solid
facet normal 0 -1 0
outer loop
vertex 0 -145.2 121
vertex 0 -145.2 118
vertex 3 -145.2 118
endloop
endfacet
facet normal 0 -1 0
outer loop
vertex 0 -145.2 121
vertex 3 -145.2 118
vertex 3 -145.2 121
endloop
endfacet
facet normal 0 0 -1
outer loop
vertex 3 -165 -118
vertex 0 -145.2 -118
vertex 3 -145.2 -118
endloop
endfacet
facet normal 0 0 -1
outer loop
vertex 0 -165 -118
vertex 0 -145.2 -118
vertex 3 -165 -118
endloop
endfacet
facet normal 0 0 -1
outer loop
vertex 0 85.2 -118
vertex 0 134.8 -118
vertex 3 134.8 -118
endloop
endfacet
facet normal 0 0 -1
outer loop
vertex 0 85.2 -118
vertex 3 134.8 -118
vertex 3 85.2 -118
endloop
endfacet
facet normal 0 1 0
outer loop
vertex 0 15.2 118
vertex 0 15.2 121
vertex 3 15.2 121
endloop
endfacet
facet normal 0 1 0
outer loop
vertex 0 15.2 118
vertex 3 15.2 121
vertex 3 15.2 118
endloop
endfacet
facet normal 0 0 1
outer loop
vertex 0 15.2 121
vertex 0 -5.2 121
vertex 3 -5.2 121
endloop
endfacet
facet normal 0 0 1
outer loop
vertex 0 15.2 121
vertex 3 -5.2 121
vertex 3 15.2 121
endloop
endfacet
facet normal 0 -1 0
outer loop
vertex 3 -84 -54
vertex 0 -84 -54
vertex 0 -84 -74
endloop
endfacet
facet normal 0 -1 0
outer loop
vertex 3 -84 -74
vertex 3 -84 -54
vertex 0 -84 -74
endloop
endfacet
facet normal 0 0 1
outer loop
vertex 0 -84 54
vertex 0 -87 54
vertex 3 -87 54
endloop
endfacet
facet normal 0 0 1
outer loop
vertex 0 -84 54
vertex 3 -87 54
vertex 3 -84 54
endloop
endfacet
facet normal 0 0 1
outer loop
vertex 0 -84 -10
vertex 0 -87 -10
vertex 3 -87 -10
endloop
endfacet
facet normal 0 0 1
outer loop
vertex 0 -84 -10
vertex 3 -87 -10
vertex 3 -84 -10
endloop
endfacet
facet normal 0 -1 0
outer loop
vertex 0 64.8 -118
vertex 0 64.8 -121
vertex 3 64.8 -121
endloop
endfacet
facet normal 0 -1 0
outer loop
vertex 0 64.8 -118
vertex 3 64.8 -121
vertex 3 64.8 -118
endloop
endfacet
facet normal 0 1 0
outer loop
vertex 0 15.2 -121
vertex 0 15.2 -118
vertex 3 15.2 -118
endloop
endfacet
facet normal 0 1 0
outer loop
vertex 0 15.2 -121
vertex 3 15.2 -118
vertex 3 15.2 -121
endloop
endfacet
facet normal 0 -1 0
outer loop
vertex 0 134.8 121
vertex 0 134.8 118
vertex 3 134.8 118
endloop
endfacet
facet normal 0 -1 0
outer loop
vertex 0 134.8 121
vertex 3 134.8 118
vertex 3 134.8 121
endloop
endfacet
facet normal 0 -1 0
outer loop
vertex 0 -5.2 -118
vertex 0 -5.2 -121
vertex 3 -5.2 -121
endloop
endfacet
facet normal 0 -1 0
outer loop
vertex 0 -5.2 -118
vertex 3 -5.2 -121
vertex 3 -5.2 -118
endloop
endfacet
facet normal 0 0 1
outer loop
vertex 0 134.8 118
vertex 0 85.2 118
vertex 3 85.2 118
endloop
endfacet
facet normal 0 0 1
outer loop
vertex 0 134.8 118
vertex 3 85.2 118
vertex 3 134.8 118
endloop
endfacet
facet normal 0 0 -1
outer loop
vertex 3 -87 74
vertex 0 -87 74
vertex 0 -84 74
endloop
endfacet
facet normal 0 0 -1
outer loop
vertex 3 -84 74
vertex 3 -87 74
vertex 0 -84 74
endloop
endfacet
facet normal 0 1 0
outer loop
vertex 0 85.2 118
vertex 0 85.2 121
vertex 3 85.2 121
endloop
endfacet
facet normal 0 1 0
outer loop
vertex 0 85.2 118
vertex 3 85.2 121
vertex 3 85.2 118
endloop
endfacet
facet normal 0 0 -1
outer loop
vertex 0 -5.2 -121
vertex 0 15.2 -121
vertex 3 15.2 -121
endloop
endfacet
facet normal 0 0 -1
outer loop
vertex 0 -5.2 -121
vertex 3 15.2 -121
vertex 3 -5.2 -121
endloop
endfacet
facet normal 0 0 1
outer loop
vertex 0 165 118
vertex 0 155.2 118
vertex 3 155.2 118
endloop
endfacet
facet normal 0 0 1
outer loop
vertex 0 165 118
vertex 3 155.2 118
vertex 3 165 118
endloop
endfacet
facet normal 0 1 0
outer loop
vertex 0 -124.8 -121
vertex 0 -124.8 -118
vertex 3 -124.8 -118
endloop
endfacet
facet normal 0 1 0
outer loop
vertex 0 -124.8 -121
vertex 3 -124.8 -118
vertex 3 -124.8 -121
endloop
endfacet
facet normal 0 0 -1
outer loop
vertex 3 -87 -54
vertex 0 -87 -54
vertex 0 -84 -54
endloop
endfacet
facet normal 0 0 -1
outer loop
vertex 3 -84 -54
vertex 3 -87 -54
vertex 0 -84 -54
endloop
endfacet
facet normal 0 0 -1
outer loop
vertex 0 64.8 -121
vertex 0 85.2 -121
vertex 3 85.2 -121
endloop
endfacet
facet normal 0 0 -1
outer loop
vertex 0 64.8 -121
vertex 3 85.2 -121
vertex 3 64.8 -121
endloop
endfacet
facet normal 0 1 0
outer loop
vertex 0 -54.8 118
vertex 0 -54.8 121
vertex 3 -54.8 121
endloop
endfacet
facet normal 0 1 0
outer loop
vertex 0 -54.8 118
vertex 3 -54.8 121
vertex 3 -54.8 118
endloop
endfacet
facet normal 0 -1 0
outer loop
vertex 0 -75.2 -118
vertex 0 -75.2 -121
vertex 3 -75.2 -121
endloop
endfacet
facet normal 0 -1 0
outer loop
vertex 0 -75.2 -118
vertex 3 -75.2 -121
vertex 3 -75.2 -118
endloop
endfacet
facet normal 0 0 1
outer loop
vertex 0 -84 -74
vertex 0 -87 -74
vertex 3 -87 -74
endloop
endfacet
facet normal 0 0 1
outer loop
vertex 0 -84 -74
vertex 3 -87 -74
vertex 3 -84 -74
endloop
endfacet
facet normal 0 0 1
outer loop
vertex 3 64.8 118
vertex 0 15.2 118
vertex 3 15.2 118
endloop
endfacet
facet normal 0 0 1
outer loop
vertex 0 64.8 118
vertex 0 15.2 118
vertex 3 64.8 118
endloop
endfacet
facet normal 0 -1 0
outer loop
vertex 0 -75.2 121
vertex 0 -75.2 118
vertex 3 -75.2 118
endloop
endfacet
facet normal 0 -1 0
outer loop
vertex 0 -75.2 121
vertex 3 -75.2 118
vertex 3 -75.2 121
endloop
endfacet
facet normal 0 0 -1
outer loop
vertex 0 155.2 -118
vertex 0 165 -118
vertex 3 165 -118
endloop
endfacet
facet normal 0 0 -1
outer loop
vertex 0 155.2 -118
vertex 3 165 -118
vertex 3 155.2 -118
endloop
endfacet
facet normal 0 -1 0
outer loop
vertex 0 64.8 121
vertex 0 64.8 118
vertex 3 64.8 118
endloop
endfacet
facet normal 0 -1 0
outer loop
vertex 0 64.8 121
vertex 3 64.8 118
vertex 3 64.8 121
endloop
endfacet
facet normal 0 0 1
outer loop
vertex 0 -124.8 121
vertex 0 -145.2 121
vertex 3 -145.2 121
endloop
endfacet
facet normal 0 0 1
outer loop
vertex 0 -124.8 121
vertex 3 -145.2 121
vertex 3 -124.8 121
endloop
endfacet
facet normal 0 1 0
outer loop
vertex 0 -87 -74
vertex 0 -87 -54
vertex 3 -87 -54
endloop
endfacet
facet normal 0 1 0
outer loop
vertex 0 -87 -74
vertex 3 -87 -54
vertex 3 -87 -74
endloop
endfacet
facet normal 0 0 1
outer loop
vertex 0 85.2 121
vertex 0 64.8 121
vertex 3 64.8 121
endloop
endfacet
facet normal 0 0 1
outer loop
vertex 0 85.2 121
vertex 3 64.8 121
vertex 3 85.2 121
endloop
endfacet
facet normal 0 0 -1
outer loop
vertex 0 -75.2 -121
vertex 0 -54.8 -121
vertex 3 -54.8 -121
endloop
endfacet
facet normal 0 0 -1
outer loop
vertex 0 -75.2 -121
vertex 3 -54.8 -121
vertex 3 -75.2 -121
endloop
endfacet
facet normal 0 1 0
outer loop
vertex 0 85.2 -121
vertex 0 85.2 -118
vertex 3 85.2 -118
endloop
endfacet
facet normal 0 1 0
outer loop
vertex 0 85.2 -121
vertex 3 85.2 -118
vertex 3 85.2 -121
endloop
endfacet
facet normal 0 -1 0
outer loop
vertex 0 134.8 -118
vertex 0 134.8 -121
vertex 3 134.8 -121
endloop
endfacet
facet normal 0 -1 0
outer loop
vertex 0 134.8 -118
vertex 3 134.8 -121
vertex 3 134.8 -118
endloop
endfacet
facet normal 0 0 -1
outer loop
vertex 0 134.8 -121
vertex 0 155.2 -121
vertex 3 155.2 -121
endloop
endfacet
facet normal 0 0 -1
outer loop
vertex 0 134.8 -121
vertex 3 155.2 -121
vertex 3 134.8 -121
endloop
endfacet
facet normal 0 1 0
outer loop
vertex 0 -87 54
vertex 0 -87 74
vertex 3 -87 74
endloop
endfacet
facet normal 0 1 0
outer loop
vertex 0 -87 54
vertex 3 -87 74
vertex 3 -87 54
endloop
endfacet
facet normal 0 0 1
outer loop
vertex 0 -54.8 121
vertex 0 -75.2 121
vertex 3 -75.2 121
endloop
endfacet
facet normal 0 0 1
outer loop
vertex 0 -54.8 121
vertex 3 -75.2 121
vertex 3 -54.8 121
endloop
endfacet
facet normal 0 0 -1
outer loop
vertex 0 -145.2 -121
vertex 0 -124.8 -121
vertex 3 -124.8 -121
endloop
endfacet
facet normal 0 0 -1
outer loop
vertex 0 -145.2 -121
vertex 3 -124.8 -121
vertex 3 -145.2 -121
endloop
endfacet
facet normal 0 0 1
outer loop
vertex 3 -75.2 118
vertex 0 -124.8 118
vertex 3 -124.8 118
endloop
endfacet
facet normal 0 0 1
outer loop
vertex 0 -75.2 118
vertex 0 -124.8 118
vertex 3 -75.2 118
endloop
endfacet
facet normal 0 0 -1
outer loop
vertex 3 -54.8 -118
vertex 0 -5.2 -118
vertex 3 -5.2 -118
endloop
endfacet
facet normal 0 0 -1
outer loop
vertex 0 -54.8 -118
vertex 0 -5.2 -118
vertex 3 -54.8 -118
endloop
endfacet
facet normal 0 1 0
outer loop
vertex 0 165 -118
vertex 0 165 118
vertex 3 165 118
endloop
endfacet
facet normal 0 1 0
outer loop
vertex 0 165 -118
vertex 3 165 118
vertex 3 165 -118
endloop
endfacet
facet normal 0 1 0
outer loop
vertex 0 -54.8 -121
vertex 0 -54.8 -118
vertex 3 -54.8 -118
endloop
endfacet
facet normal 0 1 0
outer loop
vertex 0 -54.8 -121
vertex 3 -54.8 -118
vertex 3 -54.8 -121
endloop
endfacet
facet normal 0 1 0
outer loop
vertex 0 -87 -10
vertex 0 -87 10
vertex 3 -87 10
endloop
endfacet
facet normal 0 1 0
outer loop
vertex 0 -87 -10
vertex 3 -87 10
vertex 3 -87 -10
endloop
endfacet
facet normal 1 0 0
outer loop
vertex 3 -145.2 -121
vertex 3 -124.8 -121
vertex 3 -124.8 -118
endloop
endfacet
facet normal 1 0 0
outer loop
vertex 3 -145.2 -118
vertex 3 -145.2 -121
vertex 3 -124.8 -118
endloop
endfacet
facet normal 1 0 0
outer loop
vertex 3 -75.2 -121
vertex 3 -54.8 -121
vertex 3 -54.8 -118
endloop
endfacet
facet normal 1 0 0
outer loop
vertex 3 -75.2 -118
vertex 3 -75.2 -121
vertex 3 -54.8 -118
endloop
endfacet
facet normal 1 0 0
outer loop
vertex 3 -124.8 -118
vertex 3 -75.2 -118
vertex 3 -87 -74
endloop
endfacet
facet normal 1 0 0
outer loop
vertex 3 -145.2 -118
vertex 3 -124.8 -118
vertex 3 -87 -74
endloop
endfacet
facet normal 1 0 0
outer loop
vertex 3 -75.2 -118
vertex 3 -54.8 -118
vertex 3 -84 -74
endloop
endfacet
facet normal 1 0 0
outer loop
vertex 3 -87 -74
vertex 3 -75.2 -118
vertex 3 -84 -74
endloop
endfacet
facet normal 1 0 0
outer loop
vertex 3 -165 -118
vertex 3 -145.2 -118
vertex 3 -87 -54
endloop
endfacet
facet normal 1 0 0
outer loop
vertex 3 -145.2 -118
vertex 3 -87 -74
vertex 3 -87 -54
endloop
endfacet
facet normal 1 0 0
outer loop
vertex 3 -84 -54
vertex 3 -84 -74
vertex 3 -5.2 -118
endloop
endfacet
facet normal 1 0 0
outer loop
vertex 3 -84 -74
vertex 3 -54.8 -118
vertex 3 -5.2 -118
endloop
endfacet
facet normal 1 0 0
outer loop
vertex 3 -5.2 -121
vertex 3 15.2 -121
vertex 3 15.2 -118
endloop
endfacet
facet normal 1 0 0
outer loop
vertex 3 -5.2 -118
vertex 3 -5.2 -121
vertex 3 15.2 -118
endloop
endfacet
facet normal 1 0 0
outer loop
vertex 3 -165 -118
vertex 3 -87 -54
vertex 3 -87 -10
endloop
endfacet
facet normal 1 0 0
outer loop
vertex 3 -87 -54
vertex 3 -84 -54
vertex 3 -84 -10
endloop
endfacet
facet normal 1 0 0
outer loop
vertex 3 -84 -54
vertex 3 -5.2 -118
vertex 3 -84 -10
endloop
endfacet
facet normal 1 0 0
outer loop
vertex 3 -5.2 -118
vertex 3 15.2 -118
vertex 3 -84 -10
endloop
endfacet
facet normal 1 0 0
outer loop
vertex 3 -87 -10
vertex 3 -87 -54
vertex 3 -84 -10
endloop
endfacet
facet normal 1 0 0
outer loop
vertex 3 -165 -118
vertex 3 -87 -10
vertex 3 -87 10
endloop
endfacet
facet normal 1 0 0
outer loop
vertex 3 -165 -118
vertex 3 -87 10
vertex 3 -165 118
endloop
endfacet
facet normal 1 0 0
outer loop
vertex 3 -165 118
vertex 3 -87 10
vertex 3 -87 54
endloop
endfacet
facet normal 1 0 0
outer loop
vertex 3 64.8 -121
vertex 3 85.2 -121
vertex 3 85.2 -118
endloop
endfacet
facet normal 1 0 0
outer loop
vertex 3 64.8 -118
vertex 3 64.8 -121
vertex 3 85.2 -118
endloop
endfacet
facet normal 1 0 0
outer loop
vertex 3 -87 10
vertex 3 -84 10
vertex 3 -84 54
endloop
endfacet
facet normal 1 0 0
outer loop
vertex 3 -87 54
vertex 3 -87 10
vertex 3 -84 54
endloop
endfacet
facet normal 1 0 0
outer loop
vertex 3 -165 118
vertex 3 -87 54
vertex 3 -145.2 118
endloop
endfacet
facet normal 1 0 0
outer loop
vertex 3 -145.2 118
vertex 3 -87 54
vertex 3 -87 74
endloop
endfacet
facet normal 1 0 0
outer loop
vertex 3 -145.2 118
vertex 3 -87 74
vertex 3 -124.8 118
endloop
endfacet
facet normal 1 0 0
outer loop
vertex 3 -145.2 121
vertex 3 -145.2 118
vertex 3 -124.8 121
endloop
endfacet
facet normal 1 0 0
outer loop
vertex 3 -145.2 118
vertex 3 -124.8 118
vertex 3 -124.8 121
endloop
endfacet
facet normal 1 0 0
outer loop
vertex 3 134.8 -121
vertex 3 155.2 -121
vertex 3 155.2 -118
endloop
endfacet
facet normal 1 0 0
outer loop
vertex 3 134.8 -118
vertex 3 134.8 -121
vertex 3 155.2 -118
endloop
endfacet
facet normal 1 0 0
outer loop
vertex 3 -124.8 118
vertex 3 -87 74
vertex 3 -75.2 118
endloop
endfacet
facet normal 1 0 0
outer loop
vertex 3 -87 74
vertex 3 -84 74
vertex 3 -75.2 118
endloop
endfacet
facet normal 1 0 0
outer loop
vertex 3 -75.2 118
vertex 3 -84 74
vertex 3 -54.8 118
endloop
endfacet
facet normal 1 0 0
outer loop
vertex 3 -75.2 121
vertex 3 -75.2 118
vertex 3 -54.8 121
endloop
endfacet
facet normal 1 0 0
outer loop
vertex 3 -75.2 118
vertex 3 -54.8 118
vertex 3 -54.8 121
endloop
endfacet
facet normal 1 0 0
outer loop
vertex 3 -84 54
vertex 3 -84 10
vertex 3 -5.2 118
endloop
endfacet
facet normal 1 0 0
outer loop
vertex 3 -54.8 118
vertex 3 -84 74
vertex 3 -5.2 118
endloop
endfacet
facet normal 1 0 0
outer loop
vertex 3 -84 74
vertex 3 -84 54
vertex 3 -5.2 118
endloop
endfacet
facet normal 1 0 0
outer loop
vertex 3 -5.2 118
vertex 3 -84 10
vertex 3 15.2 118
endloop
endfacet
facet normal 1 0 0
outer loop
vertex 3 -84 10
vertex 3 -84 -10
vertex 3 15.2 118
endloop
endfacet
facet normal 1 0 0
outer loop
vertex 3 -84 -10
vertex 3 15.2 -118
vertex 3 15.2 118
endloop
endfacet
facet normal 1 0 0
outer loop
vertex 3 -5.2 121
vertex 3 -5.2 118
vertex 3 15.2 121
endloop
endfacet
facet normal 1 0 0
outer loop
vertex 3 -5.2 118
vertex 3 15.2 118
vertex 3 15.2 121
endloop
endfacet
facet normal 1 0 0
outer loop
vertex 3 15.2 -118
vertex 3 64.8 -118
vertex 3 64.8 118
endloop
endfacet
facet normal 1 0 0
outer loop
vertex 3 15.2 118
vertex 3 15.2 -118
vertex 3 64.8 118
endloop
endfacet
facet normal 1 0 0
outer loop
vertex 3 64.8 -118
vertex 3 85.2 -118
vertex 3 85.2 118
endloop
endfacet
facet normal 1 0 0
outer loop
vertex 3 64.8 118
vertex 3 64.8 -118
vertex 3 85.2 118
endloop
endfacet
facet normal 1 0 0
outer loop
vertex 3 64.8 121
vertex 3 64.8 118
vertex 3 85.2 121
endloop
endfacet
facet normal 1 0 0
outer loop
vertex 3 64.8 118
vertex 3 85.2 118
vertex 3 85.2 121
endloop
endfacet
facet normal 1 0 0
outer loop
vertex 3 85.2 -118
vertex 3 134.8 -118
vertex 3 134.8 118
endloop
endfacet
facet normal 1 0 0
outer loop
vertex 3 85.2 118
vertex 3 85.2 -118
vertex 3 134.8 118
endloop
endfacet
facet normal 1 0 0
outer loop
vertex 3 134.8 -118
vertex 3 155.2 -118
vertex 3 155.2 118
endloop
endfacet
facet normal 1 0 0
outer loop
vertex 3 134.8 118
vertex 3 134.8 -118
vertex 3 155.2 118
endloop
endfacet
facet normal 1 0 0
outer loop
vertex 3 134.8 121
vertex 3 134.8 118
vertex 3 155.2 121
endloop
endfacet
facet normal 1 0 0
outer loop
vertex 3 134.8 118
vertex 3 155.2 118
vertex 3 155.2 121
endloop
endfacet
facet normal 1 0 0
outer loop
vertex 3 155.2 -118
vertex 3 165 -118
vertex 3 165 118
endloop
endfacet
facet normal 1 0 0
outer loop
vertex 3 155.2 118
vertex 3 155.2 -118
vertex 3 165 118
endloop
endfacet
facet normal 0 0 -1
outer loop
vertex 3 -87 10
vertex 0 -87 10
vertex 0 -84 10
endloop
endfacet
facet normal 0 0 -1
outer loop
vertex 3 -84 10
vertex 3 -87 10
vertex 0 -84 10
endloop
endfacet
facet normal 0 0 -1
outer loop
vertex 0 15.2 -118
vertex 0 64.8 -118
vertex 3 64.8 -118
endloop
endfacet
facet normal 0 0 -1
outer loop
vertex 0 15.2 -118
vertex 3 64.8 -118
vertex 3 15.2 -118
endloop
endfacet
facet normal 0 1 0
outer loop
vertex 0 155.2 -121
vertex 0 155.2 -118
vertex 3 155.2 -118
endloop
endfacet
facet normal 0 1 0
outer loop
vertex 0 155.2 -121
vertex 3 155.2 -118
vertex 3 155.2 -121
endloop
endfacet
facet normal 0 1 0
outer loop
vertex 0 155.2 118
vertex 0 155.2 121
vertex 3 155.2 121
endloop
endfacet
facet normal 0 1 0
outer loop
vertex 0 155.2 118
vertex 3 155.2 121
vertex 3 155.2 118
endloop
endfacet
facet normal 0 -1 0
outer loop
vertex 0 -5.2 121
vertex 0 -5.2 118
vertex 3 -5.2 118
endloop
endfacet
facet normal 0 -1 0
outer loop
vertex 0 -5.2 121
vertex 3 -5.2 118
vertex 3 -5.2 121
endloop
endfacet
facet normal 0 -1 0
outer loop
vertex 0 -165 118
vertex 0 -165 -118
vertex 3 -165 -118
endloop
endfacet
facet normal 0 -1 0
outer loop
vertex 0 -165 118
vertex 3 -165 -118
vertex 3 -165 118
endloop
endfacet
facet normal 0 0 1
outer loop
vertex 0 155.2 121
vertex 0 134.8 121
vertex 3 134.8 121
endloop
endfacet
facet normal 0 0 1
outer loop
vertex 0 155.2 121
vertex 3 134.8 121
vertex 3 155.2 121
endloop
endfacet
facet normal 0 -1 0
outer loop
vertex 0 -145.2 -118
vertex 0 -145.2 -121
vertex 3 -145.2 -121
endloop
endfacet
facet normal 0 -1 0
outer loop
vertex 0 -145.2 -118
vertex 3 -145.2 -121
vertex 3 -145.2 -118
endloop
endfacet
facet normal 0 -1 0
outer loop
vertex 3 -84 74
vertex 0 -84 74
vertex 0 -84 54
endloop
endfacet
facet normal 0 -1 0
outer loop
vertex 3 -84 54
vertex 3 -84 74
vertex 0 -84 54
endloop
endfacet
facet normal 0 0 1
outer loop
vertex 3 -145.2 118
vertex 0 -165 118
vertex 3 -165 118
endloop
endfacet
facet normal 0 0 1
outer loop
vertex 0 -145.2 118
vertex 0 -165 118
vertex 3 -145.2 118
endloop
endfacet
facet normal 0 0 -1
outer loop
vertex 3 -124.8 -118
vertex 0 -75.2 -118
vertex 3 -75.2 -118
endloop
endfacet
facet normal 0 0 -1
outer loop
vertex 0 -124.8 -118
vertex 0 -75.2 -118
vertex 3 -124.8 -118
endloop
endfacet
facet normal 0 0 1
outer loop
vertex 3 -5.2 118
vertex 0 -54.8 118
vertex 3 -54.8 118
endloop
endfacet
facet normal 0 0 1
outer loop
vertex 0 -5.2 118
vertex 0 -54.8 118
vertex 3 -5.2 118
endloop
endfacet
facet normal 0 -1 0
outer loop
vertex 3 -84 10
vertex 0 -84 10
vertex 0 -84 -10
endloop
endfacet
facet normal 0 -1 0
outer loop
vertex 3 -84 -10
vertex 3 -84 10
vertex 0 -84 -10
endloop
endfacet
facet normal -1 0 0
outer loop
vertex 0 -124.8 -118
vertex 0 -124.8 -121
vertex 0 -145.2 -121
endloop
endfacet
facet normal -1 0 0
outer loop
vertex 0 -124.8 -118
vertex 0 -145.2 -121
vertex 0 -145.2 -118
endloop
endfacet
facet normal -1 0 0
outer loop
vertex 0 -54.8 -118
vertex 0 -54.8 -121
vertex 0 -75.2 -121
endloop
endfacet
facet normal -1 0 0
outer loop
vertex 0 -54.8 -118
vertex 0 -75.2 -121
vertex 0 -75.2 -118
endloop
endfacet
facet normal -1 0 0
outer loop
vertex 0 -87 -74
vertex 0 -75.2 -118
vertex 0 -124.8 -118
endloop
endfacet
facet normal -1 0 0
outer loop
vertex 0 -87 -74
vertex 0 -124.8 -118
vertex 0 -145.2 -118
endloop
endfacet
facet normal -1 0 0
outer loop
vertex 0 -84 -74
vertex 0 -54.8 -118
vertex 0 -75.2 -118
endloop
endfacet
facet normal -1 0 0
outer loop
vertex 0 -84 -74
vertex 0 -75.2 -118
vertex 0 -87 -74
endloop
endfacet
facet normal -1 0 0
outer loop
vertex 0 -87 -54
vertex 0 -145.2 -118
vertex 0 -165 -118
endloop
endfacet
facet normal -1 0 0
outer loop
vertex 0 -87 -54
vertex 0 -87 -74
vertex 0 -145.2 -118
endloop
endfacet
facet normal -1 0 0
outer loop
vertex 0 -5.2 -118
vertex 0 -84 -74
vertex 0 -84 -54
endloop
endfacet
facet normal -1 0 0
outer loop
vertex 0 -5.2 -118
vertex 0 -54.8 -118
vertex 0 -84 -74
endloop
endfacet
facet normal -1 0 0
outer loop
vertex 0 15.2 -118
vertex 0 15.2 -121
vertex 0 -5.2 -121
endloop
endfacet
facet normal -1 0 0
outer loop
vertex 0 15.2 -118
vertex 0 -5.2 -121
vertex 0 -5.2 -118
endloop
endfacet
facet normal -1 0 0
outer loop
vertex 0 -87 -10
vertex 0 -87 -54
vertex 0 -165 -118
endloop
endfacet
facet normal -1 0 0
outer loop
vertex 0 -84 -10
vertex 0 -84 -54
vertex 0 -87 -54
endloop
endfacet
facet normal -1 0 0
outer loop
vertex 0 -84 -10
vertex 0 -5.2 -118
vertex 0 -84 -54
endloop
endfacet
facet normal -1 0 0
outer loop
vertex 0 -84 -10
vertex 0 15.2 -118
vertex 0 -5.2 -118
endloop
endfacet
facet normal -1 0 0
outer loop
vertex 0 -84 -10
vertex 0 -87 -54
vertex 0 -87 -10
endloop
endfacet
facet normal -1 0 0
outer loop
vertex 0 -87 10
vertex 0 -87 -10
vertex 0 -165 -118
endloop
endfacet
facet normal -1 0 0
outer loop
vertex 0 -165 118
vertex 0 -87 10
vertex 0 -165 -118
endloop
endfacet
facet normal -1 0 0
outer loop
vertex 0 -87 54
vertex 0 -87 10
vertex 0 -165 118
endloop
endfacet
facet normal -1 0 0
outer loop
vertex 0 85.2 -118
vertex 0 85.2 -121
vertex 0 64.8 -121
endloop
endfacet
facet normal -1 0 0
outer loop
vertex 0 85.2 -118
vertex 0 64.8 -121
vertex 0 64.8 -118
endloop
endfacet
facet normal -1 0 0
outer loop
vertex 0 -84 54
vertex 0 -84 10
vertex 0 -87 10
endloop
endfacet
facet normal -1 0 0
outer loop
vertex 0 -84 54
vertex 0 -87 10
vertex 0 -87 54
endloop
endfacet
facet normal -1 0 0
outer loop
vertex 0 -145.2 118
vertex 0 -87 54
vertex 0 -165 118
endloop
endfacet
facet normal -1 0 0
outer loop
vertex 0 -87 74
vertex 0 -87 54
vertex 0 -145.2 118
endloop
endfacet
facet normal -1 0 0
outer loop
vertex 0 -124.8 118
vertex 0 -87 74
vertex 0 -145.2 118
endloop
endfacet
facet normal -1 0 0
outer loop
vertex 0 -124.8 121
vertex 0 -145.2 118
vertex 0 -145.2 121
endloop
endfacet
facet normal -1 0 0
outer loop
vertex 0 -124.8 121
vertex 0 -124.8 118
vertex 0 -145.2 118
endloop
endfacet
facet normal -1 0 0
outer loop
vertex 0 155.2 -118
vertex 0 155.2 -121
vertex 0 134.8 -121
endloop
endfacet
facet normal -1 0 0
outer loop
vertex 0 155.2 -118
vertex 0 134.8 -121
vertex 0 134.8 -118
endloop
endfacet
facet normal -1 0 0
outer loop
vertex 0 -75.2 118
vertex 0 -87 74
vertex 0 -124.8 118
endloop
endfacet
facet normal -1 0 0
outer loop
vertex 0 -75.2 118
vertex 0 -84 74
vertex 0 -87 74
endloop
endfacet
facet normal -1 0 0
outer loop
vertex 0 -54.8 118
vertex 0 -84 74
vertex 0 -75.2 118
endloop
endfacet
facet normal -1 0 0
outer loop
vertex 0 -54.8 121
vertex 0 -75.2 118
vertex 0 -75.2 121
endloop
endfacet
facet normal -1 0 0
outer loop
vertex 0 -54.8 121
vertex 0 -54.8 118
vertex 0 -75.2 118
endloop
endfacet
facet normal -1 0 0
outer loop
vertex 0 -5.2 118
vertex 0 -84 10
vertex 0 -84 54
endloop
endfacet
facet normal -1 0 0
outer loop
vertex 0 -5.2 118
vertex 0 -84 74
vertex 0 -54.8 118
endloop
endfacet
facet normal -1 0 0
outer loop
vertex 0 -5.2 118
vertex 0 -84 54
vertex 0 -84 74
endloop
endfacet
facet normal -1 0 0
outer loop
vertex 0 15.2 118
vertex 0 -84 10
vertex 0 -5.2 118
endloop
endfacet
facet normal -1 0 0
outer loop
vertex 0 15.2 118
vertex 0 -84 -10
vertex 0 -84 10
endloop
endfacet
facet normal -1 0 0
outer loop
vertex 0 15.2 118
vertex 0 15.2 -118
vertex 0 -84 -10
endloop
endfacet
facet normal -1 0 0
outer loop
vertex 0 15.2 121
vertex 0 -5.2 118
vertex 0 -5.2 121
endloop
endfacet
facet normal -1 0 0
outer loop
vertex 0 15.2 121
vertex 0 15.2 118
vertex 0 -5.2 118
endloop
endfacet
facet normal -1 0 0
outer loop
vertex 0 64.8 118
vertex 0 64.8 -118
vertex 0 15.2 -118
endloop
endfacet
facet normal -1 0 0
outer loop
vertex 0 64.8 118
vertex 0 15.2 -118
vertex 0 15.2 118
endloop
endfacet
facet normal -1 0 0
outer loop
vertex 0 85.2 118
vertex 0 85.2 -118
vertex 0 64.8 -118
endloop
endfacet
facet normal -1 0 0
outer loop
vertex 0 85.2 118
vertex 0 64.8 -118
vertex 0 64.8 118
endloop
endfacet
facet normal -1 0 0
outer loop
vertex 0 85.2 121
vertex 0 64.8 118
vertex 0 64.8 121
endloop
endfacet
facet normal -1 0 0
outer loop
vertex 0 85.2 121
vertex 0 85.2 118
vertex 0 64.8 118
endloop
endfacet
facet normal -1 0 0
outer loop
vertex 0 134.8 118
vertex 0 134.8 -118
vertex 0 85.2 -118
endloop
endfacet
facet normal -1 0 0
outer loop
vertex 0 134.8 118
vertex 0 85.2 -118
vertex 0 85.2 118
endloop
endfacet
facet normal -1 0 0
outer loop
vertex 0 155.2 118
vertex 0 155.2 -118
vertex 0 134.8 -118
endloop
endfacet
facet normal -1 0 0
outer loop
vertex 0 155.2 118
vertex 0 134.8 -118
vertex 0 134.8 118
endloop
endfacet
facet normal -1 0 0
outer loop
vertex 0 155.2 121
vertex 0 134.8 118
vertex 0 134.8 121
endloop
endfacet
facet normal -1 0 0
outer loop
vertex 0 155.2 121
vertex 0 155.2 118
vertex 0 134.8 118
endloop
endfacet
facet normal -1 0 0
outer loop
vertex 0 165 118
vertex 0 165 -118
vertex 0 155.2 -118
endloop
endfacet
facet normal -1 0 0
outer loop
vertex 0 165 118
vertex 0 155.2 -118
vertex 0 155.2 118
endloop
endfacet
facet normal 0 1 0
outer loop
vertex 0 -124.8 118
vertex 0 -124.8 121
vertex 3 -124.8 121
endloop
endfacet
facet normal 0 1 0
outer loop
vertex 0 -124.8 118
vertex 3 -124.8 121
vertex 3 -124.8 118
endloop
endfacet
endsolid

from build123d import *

# Parameters (mm, degrees)
SKETCH_1_W      = 20
SKETCH_1_H      = 3
EXTRUDE_1_DEPTH = 3


with BuildPart() as part:
    # Эскиз1 → Бобышка-Вытянуть1 (new body)
    with BuildSketch(Plane(origin=(0, 0, 0), x_dir=(0, 0, -1), z_dir=(1, 0, 0))):
        Polygon((-118, -165), (-118, -145.2), (-121, -145.2), (-121, -124.8), (-118, -124.8), (-118, -75.2), (-121, -75.2), (-121, -54.8), (-118, -54.8), (-118, -5.2), (-121, -5.2), (-121, 15.2), (-118, 15.2), (-118, 64.8), (-121, 64.8), (-121, 85.2), (-118, 85.2), (-118, 134.8), (-121, 134.8), (-121, 155.2), (-118, 155.2), (-118, 165), (118, 165), (118, 155.2), (121, 155.2), (121, 134.8), (118, 134.8), (118, 85.2), (121, 85.2), (121, 64.8), (118, 64.8), (118, 15.2), (121, 15.2), (121, -5.2), (118, -5.2), (118, -54.8), (121, -54.8), (121, -75.2), (118, -75.2), (118, -124.8), (121, -124.8), (121, -145.2), (118, -145.2), (118, -165), align=None)
        with Locations((-64, -85.5)):
            Rectangle(SKETCH_1_W, SKETCH_1_H, mode=Mode.SUBTRACT)
        with Locations((0, -85.5)):
            Rectangle(SKETCH_1_W, SKETCH_1_H, mode=Mode.SUBTRACT)
        with Locations((64, -85.5)):
            Rectangle(SKETCH_1_W, SKETCH_1_H, mode=Mode.SUBTRACT)
    extrude(amount=EXTRUDE_1_DEPTH)


solid = part.part
